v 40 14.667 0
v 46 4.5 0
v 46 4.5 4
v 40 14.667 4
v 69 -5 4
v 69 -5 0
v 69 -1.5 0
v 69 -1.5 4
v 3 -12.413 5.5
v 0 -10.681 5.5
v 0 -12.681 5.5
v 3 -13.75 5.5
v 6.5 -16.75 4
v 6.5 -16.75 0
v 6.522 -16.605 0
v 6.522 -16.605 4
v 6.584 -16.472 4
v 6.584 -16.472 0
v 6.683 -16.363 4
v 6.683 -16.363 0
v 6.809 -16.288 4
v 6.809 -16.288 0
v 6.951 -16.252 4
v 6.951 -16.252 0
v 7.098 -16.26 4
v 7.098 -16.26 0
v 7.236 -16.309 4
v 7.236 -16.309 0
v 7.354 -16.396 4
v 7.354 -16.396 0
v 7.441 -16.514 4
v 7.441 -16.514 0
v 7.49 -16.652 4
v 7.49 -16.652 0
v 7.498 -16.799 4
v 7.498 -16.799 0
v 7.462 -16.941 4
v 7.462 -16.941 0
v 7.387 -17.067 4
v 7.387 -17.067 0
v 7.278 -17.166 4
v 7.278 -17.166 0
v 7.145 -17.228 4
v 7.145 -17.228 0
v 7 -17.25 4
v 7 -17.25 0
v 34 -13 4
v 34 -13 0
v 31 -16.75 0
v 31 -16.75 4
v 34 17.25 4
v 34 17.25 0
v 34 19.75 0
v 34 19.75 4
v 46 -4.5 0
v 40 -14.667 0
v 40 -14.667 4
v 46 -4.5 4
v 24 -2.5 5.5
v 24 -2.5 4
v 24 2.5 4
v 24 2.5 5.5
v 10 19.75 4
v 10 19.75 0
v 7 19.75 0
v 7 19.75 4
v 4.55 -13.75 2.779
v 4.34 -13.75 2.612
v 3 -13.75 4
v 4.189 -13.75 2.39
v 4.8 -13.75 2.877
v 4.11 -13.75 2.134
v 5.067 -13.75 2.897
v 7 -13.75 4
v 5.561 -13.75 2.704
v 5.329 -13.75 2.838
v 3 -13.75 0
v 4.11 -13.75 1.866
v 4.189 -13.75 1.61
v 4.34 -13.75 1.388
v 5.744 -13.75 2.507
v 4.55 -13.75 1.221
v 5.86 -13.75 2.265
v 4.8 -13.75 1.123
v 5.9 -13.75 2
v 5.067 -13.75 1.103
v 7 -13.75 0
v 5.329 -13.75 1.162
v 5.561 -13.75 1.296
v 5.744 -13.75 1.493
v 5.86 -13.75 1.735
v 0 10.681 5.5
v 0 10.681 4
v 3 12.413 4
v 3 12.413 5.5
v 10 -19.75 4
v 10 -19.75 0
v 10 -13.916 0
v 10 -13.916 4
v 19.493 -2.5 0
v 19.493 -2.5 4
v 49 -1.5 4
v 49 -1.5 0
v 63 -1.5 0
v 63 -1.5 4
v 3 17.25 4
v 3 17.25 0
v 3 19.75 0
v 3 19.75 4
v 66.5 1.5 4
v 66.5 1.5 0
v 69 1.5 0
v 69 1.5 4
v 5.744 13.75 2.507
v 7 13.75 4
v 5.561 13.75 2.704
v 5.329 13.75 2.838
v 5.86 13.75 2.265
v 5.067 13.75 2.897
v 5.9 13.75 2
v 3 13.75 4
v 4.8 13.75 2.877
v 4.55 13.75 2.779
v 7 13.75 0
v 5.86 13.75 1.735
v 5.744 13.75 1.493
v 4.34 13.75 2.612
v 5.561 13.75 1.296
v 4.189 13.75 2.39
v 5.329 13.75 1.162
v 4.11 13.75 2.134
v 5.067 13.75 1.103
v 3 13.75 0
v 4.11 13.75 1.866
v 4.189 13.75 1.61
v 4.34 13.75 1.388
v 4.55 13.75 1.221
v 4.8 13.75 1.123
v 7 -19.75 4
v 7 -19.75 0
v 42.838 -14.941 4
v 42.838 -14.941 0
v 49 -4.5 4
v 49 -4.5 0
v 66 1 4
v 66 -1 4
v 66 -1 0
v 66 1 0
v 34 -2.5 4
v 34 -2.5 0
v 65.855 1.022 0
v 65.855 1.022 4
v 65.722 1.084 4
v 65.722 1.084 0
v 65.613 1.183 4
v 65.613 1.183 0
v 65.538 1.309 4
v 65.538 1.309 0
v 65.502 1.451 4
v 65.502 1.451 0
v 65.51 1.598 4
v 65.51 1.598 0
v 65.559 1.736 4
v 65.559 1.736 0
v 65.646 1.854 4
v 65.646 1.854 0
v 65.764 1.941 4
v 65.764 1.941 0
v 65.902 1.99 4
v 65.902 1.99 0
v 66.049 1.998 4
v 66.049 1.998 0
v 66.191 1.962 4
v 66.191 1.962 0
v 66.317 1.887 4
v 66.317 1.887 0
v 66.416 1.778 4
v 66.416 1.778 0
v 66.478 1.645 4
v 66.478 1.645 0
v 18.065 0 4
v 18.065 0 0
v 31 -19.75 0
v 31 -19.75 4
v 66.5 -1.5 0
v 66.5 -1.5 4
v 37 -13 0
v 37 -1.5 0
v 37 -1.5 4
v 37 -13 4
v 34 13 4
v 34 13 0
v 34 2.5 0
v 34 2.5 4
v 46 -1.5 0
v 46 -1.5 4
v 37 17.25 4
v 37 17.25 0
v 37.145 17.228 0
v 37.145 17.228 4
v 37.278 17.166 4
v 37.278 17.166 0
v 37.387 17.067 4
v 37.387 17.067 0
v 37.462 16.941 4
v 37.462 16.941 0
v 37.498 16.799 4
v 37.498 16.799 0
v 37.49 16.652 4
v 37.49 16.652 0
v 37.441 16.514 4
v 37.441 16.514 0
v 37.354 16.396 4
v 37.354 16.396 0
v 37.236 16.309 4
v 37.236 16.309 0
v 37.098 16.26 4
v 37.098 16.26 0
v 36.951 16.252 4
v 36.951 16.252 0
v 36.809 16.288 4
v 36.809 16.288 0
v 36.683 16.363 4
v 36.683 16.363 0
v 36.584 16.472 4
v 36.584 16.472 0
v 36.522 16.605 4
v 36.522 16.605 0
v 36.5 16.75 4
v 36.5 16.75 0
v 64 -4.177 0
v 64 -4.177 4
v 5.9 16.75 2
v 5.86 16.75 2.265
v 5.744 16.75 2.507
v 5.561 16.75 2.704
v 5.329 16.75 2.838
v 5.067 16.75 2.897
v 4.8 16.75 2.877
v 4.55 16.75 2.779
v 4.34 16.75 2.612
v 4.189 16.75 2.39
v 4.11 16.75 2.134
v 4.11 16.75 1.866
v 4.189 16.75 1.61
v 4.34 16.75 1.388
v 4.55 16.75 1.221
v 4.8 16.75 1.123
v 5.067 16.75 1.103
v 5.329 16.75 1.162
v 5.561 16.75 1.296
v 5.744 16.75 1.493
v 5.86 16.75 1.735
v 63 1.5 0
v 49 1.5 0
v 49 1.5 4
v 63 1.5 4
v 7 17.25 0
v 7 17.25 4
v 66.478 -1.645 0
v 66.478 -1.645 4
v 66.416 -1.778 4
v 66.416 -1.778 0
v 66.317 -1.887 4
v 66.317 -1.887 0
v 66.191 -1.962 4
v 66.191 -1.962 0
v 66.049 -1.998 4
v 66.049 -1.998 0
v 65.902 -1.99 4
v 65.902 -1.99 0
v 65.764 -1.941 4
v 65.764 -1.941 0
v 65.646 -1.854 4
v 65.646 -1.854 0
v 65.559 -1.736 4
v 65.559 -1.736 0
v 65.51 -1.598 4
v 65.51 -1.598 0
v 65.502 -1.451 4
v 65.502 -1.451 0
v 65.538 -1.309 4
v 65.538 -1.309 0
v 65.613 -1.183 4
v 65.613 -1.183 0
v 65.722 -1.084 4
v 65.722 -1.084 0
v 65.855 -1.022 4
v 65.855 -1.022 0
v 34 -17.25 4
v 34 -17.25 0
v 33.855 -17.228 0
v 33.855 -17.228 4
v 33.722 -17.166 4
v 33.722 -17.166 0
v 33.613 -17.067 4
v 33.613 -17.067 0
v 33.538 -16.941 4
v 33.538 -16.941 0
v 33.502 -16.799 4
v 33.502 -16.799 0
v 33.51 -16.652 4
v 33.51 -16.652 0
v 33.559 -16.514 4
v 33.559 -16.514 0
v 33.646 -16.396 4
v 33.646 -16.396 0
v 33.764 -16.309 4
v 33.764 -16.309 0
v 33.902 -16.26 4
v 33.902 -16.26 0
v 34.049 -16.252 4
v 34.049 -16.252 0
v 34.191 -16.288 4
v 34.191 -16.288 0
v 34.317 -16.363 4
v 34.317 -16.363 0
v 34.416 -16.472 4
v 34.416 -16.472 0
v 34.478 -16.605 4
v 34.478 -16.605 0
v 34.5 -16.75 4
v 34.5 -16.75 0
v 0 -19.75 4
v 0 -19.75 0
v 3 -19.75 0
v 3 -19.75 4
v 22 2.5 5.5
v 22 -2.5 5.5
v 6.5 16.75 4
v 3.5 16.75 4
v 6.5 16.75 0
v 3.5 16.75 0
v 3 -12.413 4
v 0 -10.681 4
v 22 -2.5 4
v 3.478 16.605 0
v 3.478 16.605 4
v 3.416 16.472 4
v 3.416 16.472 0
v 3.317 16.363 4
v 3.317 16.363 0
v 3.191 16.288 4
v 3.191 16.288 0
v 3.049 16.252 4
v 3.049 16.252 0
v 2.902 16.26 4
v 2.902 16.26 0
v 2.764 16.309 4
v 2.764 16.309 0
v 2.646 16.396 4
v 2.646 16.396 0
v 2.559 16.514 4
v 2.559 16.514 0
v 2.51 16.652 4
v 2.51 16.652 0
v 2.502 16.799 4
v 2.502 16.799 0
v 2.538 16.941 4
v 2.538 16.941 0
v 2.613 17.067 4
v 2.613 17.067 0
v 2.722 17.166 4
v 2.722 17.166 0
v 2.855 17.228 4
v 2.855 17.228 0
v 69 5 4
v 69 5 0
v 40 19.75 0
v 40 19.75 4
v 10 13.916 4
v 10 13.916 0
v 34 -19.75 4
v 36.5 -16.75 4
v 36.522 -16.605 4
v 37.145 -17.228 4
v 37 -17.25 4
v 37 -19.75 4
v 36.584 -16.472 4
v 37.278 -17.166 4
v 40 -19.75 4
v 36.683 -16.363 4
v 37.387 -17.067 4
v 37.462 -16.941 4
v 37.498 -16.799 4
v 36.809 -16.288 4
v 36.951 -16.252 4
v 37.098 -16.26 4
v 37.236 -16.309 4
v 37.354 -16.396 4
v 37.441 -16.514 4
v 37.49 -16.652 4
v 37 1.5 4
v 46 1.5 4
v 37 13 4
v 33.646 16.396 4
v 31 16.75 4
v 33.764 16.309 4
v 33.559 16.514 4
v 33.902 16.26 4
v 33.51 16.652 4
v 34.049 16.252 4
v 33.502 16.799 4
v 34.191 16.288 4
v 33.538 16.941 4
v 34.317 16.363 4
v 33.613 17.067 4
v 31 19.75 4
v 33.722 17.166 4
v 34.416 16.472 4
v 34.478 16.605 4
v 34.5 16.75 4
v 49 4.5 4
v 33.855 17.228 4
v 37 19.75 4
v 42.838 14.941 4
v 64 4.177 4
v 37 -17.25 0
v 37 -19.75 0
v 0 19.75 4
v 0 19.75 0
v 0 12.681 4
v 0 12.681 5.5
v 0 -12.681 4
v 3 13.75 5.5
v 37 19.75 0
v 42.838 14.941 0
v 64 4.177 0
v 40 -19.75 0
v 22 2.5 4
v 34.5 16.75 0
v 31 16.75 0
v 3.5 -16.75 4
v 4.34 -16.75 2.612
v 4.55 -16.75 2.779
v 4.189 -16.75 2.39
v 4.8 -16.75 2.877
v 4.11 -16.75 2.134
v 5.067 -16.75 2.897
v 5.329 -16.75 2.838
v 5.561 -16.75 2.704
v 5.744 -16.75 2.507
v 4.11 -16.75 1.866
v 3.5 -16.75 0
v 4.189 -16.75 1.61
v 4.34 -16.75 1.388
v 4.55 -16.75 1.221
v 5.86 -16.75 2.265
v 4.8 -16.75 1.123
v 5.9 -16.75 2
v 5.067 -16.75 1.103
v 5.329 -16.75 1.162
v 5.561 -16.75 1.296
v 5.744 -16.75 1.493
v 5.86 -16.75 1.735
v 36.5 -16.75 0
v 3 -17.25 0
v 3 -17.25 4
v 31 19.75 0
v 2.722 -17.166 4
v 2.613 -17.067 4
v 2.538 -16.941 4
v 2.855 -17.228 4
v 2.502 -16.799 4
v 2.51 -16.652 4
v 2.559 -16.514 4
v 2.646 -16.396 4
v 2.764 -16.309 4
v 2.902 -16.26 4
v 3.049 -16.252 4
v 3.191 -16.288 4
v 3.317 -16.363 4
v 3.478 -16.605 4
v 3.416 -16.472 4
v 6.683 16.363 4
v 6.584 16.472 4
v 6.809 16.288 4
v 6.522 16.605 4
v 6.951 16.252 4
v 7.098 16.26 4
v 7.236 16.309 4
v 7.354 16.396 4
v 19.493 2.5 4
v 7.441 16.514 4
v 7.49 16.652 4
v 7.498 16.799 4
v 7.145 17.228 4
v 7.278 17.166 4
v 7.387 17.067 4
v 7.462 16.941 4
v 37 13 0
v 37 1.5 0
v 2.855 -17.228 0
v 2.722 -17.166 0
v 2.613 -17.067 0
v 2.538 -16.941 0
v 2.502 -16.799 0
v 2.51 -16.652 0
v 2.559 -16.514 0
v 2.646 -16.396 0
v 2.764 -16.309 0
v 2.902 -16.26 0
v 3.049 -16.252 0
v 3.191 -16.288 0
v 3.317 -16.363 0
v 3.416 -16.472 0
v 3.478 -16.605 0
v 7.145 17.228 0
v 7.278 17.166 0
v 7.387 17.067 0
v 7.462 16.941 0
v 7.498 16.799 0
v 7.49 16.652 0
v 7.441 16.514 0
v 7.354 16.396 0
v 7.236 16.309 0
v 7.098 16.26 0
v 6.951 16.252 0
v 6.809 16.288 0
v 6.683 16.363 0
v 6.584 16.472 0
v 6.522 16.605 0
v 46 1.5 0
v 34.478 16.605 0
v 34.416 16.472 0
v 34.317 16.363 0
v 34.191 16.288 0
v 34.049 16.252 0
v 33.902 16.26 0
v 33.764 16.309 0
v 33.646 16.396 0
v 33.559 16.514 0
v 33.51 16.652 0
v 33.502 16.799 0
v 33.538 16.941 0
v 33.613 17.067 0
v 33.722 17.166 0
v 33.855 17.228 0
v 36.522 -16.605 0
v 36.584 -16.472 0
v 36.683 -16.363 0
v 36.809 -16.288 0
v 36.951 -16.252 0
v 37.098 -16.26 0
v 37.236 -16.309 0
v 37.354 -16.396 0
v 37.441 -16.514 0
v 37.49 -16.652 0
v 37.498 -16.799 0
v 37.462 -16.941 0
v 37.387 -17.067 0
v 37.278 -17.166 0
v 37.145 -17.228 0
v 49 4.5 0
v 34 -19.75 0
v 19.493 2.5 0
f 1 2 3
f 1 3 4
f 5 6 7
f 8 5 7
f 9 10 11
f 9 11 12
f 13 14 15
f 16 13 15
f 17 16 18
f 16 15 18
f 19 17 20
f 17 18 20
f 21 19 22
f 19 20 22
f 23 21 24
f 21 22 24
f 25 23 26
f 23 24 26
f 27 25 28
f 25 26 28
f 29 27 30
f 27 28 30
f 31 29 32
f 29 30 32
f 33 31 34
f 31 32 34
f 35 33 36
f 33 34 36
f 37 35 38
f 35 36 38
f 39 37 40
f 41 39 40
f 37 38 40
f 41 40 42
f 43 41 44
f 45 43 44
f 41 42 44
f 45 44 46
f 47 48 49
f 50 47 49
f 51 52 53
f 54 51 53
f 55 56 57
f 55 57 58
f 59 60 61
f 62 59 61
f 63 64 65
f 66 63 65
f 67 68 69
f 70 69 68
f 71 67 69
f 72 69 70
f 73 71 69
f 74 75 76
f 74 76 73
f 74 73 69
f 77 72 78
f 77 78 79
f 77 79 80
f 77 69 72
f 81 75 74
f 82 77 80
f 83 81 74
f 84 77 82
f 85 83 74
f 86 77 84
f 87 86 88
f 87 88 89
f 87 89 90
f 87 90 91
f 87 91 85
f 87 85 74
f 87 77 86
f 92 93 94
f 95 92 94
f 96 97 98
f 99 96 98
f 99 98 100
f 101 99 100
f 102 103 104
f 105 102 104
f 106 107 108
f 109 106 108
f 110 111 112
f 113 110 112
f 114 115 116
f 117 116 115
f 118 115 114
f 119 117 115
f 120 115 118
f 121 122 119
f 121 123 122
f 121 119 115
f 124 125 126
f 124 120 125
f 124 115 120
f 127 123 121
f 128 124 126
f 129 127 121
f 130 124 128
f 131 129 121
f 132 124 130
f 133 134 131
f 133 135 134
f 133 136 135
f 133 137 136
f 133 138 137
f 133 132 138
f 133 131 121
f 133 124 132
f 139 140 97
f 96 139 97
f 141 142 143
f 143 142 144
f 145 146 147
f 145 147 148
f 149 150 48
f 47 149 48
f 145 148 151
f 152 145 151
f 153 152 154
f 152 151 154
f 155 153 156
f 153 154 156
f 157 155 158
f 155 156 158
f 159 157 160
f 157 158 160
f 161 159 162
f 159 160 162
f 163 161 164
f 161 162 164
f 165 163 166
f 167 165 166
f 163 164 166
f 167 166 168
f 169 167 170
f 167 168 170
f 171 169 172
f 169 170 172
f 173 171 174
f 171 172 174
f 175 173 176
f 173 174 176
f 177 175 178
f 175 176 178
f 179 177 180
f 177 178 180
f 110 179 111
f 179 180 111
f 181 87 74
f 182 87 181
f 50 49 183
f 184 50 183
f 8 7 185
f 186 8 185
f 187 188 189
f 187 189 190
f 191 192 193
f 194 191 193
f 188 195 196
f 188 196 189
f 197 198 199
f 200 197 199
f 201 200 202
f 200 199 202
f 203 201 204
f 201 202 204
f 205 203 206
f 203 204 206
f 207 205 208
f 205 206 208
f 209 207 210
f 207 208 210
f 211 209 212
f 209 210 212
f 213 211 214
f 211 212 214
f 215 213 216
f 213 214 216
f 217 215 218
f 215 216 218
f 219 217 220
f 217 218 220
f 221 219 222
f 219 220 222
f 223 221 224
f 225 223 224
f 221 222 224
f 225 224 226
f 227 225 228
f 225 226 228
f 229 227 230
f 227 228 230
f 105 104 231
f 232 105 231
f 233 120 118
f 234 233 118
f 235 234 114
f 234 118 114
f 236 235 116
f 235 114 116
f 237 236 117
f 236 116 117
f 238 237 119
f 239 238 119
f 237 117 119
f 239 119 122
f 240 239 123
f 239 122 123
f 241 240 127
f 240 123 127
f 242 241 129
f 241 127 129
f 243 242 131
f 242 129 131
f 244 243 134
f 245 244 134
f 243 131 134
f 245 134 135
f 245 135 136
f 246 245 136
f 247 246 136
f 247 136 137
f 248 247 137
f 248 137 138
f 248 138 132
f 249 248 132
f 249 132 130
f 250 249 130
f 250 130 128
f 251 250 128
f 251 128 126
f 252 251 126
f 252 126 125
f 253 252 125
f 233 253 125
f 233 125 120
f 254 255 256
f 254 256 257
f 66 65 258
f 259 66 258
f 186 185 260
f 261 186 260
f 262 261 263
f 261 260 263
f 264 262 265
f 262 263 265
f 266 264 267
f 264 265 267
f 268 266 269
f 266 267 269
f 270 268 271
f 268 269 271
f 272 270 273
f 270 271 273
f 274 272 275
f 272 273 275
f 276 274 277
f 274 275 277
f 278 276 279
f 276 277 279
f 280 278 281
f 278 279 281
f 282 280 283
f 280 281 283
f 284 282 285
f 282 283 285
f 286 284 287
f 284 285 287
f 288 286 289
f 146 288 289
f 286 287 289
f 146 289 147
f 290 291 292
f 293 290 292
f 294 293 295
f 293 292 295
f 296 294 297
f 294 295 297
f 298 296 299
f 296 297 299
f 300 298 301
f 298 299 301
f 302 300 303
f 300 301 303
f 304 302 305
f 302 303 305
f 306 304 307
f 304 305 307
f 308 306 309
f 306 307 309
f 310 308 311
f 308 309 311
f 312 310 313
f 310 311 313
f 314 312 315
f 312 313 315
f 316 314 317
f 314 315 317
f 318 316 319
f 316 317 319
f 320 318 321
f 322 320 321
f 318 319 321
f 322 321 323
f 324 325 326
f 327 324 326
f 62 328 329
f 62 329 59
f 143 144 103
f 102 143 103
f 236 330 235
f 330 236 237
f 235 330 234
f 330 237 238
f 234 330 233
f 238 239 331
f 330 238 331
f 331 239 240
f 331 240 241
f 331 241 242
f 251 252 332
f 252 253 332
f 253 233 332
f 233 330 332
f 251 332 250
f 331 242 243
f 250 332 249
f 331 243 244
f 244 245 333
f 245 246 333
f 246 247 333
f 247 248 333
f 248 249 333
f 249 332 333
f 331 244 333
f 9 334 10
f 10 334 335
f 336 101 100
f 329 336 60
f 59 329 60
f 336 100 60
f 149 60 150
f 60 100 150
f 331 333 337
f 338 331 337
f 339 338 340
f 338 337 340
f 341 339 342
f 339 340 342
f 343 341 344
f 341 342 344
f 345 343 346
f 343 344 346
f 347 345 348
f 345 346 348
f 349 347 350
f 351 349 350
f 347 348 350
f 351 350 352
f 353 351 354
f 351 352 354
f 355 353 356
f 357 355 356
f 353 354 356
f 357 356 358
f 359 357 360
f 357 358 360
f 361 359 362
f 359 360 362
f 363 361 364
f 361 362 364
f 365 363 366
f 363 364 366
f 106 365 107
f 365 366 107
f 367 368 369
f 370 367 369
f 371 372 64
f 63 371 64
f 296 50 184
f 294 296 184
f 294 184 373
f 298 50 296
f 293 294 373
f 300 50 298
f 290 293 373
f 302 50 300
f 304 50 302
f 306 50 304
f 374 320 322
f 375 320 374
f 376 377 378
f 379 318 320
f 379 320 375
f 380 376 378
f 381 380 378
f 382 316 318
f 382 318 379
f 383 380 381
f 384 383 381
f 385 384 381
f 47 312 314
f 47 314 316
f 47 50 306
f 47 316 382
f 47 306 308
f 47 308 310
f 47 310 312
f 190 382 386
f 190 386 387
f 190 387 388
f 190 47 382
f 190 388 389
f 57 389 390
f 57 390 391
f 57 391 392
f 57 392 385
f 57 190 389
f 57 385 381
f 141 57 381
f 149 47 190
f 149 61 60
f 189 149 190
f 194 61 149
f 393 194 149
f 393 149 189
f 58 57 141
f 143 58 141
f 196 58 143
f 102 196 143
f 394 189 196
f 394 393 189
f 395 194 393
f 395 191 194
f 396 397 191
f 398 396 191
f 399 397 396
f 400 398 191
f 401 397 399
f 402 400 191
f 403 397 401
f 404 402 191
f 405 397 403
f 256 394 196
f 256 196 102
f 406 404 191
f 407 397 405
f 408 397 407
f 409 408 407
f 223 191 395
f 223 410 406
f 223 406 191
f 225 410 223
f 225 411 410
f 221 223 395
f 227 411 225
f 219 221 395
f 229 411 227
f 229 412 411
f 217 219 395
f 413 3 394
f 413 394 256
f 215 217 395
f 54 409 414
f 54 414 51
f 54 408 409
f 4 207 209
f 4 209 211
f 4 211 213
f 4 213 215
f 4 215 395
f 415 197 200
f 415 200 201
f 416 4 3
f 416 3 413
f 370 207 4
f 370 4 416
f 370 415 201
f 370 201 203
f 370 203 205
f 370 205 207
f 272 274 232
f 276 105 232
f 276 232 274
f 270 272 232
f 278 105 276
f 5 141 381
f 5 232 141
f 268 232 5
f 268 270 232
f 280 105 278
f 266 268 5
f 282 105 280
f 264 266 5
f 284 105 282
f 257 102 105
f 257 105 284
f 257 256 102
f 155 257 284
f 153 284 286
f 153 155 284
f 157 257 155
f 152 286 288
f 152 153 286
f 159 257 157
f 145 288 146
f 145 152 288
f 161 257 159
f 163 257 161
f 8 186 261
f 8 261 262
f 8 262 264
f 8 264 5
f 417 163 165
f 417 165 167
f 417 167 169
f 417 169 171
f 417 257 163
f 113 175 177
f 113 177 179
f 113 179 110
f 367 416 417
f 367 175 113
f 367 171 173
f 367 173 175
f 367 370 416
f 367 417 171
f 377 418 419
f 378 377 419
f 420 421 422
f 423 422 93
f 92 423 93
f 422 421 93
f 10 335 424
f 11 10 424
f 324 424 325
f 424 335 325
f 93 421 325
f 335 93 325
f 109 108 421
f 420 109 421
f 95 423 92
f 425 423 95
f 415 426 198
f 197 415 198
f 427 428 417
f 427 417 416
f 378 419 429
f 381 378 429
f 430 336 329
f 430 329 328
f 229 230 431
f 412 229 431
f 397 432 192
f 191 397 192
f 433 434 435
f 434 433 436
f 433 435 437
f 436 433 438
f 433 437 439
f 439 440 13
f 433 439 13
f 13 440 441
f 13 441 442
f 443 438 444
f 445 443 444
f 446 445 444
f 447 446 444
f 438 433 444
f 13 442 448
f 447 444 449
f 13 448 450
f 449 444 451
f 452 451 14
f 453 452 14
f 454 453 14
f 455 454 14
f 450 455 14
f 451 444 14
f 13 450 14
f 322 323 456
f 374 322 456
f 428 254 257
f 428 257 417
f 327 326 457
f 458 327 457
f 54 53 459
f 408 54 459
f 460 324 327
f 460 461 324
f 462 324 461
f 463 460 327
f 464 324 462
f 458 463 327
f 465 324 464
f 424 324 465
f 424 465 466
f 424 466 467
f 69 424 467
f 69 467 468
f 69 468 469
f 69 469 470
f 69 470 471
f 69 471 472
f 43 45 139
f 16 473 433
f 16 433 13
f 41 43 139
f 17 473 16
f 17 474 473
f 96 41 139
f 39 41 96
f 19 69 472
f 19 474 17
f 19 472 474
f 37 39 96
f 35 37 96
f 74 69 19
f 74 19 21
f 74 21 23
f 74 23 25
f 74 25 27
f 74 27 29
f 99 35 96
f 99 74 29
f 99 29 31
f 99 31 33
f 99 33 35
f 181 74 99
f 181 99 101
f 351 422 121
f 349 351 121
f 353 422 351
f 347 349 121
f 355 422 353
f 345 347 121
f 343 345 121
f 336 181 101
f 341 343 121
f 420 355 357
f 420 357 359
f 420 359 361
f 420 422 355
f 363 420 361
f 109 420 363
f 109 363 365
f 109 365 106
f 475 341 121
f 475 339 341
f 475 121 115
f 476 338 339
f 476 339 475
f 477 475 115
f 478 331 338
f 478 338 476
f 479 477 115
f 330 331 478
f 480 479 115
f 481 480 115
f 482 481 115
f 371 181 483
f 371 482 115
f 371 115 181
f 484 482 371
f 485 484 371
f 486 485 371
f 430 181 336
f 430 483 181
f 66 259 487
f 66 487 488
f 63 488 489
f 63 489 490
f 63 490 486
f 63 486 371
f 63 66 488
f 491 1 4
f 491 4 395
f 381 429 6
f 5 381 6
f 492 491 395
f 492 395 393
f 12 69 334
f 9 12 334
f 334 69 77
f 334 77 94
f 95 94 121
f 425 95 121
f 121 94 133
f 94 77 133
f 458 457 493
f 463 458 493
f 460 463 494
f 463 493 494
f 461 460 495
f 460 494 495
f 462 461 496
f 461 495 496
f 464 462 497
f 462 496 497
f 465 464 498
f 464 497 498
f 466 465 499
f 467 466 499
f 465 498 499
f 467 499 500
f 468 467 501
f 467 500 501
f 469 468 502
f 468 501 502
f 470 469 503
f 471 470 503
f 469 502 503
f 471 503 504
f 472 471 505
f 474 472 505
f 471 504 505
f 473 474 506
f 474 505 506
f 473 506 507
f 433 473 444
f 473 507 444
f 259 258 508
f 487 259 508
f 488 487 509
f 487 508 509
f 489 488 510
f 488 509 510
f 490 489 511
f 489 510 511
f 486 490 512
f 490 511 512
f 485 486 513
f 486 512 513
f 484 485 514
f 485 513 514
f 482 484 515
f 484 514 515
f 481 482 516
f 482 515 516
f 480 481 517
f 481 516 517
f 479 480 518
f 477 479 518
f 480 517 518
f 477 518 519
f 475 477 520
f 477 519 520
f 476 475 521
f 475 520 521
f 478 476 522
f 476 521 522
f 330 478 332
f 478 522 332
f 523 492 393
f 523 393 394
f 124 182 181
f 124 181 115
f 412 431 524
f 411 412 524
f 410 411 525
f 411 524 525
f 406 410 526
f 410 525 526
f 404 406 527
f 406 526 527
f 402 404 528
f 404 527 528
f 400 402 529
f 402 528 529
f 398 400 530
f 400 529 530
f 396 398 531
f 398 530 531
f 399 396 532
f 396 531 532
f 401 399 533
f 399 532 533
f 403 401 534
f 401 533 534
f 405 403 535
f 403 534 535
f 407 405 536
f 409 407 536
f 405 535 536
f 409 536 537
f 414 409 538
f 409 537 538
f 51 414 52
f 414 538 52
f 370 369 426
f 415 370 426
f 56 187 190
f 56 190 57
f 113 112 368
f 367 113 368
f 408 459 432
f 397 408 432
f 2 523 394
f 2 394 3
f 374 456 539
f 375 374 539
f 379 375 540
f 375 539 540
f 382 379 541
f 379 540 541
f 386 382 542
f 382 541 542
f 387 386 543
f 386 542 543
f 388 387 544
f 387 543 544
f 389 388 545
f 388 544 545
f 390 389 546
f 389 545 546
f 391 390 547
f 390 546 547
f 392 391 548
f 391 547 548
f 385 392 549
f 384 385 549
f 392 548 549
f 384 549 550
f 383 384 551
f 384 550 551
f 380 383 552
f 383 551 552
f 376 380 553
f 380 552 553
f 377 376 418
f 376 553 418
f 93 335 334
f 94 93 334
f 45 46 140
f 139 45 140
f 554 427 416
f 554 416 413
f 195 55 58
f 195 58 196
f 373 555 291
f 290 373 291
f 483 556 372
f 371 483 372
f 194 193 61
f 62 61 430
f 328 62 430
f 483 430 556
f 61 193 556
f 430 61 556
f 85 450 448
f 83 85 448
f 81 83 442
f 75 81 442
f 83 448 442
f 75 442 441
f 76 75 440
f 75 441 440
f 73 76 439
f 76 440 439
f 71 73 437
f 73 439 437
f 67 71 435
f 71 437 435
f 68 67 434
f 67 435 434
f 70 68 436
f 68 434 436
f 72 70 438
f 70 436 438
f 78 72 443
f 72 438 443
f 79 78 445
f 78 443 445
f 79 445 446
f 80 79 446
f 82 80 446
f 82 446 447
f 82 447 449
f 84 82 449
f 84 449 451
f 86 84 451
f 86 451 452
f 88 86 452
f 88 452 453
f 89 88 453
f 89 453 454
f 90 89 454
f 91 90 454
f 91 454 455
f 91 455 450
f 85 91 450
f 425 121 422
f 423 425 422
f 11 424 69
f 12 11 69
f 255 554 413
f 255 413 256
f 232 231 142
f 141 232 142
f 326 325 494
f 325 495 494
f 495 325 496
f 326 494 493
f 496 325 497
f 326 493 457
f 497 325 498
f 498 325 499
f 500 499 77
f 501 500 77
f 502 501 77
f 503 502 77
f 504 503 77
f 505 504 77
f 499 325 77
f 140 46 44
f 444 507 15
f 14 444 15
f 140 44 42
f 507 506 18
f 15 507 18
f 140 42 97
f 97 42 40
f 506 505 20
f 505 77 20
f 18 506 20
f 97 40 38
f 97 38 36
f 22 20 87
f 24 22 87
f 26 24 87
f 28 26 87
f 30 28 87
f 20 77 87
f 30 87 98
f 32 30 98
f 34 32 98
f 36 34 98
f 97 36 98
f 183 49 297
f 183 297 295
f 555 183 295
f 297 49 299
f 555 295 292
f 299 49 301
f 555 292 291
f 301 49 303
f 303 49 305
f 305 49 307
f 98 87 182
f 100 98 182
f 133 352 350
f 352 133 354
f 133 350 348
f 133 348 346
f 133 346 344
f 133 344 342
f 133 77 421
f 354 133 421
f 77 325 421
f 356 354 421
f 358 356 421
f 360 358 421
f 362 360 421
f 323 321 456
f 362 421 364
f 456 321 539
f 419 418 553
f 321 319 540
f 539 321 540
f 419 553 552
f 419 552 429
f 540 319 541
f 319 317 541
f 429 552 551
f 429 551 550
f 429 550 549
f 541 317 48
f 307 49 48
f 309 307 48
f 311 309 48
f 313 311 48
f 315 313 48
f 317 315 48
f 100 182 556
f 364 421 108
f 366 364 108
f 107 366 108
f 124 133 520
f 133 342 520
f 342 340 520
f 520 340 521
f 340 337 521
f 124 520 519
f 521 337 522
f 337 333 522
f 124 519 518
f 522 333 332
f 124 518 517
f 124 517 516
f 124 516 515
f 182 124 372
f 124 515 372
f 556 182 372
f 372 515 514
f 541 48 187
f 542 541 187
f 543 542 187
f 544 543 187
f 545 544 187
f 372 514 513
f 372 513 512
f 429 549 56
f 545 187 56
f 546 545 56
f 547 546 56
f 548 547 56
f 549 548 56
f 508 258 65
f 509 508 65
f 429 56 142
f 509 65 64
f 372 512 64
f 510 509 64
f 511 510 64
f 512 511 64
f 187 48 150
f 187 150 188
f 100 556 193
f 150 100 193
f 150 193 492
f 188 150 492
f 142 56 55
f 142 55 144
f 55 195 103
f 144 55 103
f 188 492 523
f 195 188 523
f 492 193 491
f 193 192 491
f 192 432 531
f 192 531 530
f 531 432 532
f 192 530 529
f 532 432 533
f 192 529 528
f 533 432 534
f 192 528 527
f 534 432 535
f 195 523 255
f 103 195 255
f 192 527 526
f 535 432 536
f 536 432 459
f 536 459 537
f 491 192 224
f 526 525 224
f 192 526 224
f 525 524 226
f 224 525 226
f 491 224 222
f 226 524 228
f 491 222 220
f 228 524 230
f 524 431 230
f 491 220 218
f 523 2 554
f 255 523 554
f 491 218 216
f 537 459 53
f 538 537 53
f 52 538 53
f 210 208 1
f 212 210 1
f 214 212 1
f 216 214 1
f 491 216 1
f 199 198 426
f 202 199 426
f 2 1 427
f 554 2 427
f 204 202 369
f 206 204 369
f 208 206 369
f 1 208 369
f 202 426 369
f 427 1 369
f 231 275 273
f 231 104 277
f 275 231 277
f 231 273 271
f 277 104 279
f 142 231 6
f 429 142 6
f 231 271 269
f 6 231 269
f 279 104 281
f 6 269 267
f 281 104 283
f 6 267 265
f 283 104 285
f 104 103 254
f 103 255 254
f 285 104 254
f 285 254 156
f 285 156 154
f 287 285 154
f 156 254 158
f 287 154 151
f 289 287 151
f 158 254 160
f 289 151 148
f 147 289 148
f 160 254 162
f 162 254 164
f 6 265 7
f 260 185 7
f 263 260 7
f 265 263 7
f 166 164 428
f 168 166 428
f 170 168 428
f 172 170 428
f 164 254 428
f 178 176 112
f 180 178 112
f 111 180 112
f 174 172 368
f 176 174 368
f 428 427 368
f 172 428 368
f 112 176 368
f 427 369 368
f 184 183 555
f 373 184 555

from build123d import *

# Parameters (mm, degrees)
EXTRUDE_1_DEPTH     = 4
SKETCH_2_R          = 0.9
CUT_EXTRUDE_1_DEPTH = 52
SKETCH_3_W          = 2.000000328
SKETCH_3_H          = 4.999999888
EXTRUDE_2_DEPTH     = 1.5


with BuildPart() as part:
    # 草图1 → 凸台-拉伸1 (new body)
    with BuildSketch(Plane.XY):
        with BuildLine():
            Line((66.000003368, -0.999999465), (66.000003368, 1.000000862))
            ThreePointArc((66.000003368, 1.000000862), (65.646447605, 1.853552596), (66.500000656, 1.500000013))
            Line((66.500000656, 1.500000013), (69.000001997, 1.500000013))
            Line((69.000001997, 1.500000013), (69.000001997, 4.999999655))
            Line((69.000001997, 4.999999655), (40.0000019, 19.749999745))
            Line((40.0000019, 19.749999745), (37.000001874, 19.749999745))
            Line((37.000001874, 19.749999745), (37.000001874, 17.250002129))
            ThreePointArc((37.000001874, 17.250002129), (37.353555819, 16.396448761), (36.500001792, 16.750001116))
            Line((36.500001792, 16.750001116), (34.500001871, 16.750001116))
            ThreePointArc((34.500001871, 16.750001116), (33.646447808, 16.396448765), (34.000001848, 17.250002129))
            Line((34.000001848, 17.250002129), (34.000001848, 19.749999745))
            Line((34.000001848, 19.749999745), (31.000001822, 19.749999745))
            Line((31.000001822, 19.749999745), (31.000001822, 16.750001116))
            Line((31.000001822, 16.750001116), (34.000001848, 13.000000967))
            Line((34.000001848, 13.000000967), (34.000001848, 2.500000177))
            Line((34.000001848, 2.500000177), (19.492642954, 2.500000177))
            Line((19.492642954, 2.500000177), (10.000001639, 13.915917603))
            Line((10.000001639, 13.915917603), (10.000001639, 19.749999745))
            Line((10.000001639, 19.749999745), (7.000001147, 19.749999745))
            Line((7.000001147, 19.749999745), (7.000001147, 17.250002129))
            ThreePointArc((7.000001147, 17.250002129), (7.353556004, 16.396449439), (6.500001997, 16.750001116))
            Line((6.500001997, 16.750001116), (3.500001505, 16.750001116))
            ThreePointArc((3.500001505, 16.750001116), (2.646447808, 16.396449749), (3.000002354, 17.250002129))
            Line((3.000002354, 17.250002129), (3.000002354, 19.749999745))
            Line((3.000002354, 19.749999745), (0, 19.749999745))
            Line((0, 19.749999745), (0, -19.749999745))
            Line((0, -19.749999745), (3.000002354, -19.749999745))
            Line((3.000002354, -19.749999745), (3.000002354, -17.249999742))
            ThreePointArc((3.000002354, -17.249999742), (2.646448465, -16.39644732), (3.500001505, -16.749999719))
            Line((3.500001505, -16.749999719), (6.500001997, -16.749999719))
            ThreePointArc((6.500001997, -16.749999719), (7.353555348, -16.396447009), (7.000001147, -17.249999742))
            Line((7.000001147, -17.249999742), (7.000001147, -19.749999745))
            Line((7.000001147, -19.749999745), (10.000001639, -19.749999745))
            Line((10.000001639, -19.749999745), (10.000001639, -13.915917138))
            Line((10.000001639, -13.915917138), (19.492642954, -2.499999711))
            Line((19.492642954, -2.499999711), (34.000001848, -2.499999711))
            Line((34.000001848, -2.499999711), (34.000001848, -12.999999803))
            Line((34.000001848, -12.999999803), (31.000001822, -16.749999719))
            Line((31.000001822, -16.749999719), (31.000001822, -19.749999745))
            Line((31.000001822, -19.749999745), (34.000001848, -19.749999745))
            Line((34.000001848, -19.749999745), (34.000001848, -17.249999742))
            ThreePointArc((34.000001848, -17.249999742), (33.646448464, -16.396446335), (34.500001871, -16.749999719))
            Line((34.500001871, -16.749999719), (36.500001792, -16.749999719))
            ThreePointArc((36.500001792, -16.749999719), (37.353555162, -16.396446331), (37.000001874, -17.249999742))
            Line((37.000001874, -17.249999742), (37.000001874, -19.749999745))
            Line((37.000001874, -19.749999745), (40.0000019, -19.749999745))
            Line((40.0000019, -19.749999745), (69.000001997, -5.000000121))
            Line((69.000001997, -5.000000121), (69.000001997, -1.499999547))
            Line((69.000001997, -1.499999547), (66.500000656, -1.499999547))
            ThreePointArc((66.500000656, -1.499999547), (65.646447327, -1.853550818), (66.000003368, -0.999999465))
        make_face()
        Polygon((37.000001874, 13.000000967), (37.000001874, 1.500000013), (46.000001952, 1.500000013), (46.000001952, 4.500000505), (40.0000019, 14.666666044), align=None, mode=Mode.SUBTRACT)
        Polygon((42.838321999, -14.940624125), (49.000001512, -4.500000039), (49.000001512, -1.499999547), (63.000001013, -1.499999547), (64.000001177, -4.17735544), align=None, mode=Mode.SUBTRACT)
        Polygon((46.000001952, -1.499999547), (37.000001874, -1.499999547), (37.000001874, -12.999999803), (40.0000019, -14.666666277), (46.000001952, -4.500000039), align=None, mode=Mode.SUBTRACT)
        Polygon((63.000001013, 1.500000013), (64.000001177, 4.177356837), (42.838321999, 14.940623892), (49.000001512, 4.500000505), (49.000001512, 1.500000013), align=None, mode=Mode.SUBTRACT)
        Polygon((3.000002354, -13.749999693), (7.000001147, -13.749999693), (18.065146907, -1.59e-07), (7.000001147, 13.750000624), (3.000002354, 13.750000624), align=None, mode=Mode.SUBTRACT)
    extrude(amount=EXTRUDE_1_DEPTH)

    # 草图2 → 切除-拉伸1 (cut)
    with BuildSketch(Plane.XZ.offset(16.749999719)):
        with Locations((5.000002354, 2)):
            Circle(SKETCH_2_R)
    extrude(amount=-CUT_EXTRUDE_1_DEPTH, mode=Mode.SUBTRACT)

    # 草图3 → 凸台-拉伸2 (add)
    with BuildSketch(Plane.XY.offset(4)):
        Polygon((3.000002354, 12.413031189), (3.000002354, 13.750000624), (0, 12.680980144), (0, 10.680979816), align=None)
        with Locations((23.000001907, 2.33e-07)):
            Rectangle(SKETCH_3_W, SKETCH_3_H)
        Polygon((3.000002354, -13.749999693), (3.000002354, -12.413030723), (0, -10.680979816), (0, -12.680979678), align=None)
    extrude(amount=EXTRUDE_2_DEPTH)


solid = part.part
